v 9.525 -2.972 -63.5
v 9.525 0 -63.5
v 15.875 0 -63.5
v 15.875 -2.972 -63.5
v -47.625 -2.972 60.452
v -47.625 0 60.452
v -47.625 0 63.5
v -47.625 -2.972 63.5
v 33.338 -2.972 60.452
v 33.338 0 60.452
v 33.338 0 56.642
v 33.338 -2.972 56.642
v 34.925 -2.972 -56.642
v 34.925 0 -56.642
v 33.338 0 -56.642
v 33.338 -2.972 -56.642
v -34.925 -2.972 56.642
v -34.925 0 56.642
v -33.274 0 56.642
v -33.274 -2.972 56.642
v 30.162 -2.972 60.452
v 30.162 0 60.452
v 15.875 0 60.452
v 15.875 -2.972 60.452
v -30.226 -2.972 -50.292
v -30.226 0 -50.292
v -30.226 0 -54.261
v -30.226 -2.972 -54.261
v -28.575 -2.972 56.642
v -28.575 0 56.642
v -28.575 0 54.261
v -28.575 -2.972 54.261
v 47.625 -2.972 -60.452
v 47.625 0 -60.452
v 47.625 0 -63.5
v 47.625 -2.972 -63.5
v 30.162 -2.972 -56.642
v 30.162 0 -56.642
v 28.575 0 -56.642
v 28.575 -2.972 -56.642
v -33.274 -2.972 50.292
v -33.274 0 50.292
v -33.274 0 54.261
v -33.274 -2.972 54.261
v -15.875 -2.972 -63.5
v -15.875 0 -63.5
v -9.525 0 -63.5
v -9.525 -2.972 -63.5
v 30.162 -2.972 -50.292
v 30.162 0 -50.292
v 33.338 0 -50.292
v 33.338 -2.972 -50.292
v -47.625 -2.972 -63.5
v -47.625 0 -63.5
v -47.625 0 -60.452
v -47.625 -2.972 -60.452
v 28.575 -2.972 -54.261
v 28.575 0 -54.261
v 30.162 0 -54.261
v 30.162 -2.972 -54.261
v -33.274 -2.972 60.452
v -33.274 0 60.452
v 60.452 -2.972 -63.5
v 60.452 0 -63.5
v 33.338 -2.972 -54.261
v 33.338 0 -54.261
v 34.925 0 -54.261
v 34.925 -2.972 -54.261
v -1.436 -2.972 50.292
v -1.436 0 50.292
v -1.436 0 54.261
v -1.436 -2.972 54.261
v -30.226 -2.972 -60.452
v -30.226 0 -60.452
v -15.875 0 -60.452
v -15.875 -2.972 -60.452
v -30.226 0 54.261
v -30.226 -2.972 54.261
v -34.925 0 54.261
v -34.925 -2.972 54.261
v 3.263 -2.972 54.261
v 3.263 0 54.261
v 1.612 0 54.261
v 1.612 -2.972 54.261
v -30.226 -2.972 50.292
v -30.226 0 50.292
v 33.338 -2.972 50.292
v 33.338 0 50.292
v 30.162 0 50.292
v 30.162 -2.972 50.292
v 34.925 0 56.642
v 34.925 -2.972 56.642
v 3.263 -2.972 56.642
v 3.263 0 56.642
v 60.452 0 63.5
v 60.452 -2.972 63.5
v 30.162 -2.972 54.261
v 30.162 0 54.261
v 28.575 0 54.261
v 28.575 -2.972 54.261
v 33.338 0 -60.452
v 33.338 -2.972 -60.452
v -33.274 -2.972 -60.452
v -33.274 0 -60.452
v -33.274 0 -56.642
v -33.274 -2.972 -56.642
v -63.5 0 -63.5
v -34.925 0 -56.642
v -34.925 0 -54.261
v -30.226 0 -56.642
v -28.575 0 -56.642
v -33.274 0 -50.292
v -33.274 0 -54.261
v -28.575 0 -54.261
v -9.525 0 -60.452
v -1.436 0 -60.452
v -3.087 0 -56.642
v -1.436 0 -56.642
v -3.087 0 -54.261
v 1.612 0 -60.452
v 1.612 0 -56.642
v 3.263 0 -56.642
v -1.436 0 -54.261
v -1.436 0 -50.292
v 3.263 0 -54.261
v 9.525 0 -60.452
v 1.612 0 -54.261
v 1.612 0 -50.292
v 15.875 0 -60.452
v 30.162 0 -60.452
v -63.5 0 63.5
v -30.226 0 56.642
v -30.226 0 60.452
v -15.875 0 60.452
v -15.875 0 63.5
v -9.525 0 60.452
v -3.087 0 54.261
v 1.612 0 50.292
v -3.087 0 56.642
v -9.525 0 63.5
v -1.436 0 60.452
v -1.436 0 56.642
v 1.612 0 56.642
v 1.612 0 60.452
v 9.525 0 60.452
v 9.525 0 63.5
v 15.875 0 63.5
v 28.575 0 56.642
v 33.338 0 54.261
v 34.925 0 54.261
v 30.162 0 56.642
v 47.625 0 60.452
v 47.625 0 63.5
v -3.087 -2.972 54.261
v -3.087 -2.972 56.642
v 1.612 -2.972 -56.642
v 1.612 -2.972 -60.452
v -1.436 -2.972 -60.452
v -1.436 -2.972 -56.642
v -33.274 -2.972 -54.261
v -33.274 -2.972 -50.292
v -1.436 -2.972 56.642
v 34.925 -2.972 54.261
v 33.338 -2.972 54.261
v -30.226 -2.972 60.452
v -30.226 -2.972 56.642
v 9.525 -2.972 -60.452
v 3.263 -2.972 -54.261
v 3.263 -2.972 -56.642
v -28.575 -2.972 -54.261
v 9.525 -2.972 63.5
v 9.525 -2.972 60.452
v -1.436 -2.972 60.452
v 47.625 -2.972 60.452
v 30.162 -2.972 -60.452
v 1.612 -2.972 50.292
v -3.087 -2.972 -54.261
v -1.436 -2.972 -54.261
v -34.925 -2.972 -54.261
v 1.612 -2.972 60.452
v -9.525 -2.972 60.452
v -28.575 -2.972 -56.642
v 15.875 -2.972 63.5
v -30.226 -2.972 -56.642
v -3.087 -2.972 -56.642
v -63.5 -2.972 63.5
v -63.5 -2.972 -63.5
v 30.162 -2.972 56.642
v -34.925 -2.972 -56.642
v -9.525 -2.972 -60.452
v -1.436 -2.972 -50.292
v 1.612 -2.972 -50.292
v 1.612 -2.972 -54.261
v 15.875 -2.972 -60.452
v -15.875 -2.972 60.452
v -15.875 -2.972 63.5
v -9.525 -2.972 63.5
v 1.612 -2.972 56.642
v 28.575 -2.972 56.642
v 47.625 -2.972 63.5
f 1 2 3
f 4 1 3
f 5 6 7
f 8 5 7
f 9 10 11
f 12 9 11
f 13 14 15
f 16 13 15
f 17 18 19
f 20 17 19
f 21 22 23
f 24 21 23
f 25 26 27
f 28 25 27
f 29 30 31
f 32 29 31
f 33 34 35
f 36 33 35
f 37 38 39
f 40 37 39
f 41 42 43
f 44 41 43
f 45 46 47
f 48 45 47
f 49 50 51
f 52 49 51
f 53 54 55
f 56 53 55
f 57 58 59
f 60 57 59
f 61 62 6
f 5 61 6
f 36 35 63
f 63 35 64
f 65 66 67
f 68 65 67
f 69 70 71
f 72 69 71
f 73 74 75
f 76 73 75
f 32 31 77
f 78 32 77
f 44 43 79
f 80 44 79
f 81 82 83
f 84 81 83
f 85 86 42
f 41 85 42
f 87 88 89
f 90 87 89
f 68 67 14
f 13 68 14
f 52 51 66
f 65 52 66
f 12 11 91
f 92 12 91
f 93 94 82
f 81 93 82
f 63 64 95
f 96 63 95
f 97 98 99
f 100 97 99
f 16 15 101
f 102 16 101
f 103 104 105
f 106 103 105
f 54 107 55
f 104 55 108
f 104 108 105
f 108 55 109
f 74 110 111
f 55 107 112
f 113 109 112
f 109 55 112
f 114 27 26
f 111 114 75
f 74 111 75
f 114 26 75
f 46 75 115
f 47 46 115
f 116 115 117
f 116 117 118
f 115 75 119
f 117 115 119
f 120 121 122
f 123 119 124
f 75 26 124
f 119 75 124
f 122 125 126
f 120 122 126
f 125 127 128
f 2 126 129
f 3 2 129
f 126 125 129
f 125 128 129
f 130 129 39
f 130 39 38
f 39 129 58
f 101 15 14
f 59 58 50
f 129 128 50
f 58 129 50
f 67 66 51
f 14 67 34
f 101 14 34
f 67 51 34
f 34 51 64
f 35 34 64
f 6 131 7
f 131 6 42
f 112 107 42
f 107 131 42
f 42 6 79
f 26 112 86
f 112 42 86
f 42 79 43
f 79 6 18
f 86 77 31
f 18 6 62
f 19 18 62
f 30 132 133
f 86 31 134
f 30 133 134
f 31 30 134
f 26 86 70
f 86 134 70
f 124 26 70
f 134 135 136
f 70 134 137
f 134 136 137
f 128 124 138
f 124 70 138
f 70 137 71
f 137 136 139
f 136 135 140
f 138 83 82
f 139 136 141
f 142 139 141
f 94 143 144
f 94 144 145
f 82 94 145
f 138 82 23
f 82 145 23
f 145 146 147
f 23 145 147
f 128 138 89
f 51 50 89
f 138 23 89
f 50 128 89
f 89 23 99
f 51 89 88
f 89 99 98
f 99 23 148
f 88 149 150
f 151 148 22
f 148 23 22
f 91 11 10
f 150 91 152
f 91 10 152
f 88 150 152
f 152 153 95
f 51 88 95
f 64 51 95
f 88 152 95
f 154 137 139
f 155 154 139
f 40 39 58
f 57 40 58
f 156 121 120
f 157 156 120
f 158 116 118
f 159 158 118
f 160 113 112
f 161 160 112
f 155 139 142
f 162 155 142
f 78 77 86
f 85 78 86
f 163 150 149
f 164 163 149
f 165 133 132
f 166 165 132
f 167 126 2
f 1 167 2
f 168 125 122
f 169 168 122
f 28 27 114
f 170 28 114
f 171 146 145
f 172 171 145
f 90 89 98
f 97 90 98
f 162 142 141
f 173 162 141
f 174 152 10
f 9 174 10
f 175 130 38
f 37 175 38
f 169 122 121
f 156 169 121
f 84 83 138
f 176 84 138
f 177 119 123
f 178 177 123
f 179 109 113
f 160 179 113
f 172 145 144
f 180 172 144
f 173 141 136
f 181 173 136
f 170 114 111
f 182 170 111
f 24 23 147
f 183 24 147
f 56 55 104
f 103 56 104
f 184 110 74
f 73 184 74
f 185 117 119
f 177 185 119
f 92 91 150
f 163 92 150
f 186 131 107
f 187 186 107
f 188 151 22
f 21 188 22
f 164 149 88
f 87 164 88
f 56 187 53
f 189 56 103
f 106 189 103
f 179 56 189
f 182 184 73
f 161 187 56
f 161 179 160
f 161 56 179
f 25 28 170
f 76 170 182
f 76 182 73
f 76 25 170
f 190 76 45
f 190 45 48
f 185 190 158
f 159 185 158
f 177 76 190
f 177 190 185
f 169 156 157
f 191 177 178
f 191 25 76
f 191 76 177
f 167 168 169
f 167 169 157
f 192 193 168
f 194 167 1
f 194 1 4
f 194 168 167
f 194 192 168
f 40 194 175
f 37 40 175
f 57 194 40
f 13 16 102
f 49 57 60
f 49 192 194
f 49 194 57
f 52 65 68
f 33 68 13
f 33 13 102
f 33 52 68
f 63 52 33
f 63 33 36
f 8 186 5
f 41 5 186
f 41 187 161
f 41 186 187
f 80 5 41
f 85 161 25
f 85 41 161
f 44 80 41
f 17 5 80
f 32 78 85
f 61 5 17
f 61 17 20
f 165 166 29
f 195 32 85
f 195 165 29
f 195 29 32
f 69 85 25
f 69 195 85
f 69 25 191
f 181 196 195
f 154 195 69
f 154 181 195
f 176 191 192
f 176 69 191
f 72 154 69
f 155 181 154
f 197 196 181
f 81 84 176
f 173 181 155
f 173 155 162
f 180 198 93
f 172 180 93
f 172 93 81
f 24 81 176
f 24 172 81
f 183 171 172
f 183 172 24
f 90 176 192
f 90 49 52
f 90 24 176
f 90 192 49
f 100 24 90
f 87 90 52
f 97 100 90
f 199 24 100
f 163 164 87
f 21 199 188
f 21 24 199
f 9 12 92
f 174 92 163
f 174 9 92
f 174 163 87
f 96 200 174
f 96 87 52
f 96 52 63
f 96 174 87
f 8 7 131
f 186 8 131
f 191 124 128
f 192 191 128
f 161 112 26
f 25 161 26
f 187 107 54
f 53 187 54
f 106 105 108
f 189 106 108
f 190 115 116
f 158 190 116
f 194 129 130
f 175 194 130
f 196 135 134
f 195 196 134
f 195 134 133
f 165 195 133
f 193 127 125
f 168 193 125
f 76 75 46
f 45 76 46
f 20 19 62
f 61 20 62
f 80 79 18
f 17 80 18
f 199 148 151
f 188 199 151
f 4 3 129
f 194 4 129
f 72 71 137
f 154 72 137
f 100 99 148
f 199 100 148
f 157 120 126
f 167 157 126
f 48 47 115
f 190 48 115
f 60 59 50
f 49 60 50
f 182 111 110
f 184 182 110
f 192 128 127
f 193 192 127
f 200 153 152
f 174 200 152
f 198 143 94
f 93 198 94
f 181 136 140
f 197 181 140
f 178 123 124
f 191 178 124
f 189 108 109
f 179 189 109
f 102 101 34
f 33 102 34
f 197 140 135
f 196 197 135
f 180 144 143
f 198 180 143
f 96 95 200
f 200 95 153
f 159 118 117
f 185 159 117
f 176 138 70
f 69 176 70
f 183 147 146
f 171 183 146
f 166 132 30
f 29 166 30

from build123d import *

# Parameters (mm, degrees)
F1_DEPTH = 2.9718


with BuildPart() as f1:
    # F0 (on Front) → F1 (new body)
    with BuildSketch(Plane.XZ):
        Polygon((-63.5, -60.452), (-63.5, -63.5), (-47.625, -63.5), (-47.625, -60.452), (-33.274, -60.452), (-33.274, -56.642), (-34.925, -56.642), (-34.925, -54.26075), (-33.274, -54.26075), (-33.274, -50.292), (-31.75, -50.292), (-30.226, -50.292), (-30.226, -54.26075), (-28.575, -54.26075), (-28.575, -56.642), (-30.226, -56.642), (-30.226, -60.452), (-15.875, -60.452), (-15.875, -63.5), (-9.525, -63.5), (-9.525, -60.452), (-1.436332, -60.452), (-1.436332, -56.642), (-3.087332, -56.642), (-3.087332, -54.26075), (-1.436332, -54.26075), (-1.436332, -50.292), (0.087668, -50.292), (1.611668, -50.292), (1.611668, -54.26075), (3.262668, -54.26075), (3.262668, -56.642), (1.611668, -56.642), (1.611668, -60.452), (9.525, -60.452), (9.525, -63.5), (15.875, -63.5), (15.875, -60.452), (30.1625, -60.452), (30.1625, -56.642), (28.575, -56.642), (28.575, -54.26075), (30.1625, -54.26075), (30.1625, -50.292), (31.75, -50.292), (33.3375, -50.292), (33.3375, -54.26075), (34.925, -54.26075), (34.925, -56.642), (33.3375, -56.642), (33.3375, -60.452), (47.625, -60.452), (47.625, -63.5), (60.452, -63.5), (60.452, 0), (-63.5, 0), align=None)
        Polygon((-63.5, 60.452), (-63.5, 0), (60.452, 0), (60.452, 63.5), (47.625, 63.5), (47.625, 60.452), (33.3375, 60.452), (33.3375, 56.642), (34.925, 56.642), (34.925, 54.26075), (33.3375, 54.26075), (33.3375, 50.292), (31.75, 50.292), (30.1625, 50.292), (30.1625, 54.26075), (28.575, 54.26075), (28.575, 56.642), (30.1625, 56.642), (30.1625, 60.452), (15.875, 60.452), (15.875, 63.5), (9.525, 63.5), (9.525, 60.452), (1.611668, 60.452), (1.611668, 56.642), (3.262668, 56.642), (3.262668, 54.26075), (1.611668, 54.26075), (1.611668, 50.292), (0.087668, 50.292), (-1.436332, 50.292), (-1.436332, 54.26075), (-3.087332, 54.26075), (-3.087332, 56.642), (-1.436332, 56.642), (-1.436332, 60.452), (-9.525, 60.452), (-9.525, 63.5), (-15.875, 63.5), (-15.875, 60.452), (-30.226, 60.452), (-30.226, 56.642), (-28.575, 56.642), (-28.575, 54.26075), (-30.226, 54.26075), (-30.226, 50.292), (-31.75, 50.292), (-33.274, 50.292), (-33.274, 54.26075), (-34.925, 54.26075), (-34.925, 56.642), (-33.274, 56.642), (-33.274, 60.452), (-47.625, 60.452), (-47.625, 63.5), (-63.5, 63.5), align=None)
    extrude(amount=F1_DEPTH)


solid = f1.part
